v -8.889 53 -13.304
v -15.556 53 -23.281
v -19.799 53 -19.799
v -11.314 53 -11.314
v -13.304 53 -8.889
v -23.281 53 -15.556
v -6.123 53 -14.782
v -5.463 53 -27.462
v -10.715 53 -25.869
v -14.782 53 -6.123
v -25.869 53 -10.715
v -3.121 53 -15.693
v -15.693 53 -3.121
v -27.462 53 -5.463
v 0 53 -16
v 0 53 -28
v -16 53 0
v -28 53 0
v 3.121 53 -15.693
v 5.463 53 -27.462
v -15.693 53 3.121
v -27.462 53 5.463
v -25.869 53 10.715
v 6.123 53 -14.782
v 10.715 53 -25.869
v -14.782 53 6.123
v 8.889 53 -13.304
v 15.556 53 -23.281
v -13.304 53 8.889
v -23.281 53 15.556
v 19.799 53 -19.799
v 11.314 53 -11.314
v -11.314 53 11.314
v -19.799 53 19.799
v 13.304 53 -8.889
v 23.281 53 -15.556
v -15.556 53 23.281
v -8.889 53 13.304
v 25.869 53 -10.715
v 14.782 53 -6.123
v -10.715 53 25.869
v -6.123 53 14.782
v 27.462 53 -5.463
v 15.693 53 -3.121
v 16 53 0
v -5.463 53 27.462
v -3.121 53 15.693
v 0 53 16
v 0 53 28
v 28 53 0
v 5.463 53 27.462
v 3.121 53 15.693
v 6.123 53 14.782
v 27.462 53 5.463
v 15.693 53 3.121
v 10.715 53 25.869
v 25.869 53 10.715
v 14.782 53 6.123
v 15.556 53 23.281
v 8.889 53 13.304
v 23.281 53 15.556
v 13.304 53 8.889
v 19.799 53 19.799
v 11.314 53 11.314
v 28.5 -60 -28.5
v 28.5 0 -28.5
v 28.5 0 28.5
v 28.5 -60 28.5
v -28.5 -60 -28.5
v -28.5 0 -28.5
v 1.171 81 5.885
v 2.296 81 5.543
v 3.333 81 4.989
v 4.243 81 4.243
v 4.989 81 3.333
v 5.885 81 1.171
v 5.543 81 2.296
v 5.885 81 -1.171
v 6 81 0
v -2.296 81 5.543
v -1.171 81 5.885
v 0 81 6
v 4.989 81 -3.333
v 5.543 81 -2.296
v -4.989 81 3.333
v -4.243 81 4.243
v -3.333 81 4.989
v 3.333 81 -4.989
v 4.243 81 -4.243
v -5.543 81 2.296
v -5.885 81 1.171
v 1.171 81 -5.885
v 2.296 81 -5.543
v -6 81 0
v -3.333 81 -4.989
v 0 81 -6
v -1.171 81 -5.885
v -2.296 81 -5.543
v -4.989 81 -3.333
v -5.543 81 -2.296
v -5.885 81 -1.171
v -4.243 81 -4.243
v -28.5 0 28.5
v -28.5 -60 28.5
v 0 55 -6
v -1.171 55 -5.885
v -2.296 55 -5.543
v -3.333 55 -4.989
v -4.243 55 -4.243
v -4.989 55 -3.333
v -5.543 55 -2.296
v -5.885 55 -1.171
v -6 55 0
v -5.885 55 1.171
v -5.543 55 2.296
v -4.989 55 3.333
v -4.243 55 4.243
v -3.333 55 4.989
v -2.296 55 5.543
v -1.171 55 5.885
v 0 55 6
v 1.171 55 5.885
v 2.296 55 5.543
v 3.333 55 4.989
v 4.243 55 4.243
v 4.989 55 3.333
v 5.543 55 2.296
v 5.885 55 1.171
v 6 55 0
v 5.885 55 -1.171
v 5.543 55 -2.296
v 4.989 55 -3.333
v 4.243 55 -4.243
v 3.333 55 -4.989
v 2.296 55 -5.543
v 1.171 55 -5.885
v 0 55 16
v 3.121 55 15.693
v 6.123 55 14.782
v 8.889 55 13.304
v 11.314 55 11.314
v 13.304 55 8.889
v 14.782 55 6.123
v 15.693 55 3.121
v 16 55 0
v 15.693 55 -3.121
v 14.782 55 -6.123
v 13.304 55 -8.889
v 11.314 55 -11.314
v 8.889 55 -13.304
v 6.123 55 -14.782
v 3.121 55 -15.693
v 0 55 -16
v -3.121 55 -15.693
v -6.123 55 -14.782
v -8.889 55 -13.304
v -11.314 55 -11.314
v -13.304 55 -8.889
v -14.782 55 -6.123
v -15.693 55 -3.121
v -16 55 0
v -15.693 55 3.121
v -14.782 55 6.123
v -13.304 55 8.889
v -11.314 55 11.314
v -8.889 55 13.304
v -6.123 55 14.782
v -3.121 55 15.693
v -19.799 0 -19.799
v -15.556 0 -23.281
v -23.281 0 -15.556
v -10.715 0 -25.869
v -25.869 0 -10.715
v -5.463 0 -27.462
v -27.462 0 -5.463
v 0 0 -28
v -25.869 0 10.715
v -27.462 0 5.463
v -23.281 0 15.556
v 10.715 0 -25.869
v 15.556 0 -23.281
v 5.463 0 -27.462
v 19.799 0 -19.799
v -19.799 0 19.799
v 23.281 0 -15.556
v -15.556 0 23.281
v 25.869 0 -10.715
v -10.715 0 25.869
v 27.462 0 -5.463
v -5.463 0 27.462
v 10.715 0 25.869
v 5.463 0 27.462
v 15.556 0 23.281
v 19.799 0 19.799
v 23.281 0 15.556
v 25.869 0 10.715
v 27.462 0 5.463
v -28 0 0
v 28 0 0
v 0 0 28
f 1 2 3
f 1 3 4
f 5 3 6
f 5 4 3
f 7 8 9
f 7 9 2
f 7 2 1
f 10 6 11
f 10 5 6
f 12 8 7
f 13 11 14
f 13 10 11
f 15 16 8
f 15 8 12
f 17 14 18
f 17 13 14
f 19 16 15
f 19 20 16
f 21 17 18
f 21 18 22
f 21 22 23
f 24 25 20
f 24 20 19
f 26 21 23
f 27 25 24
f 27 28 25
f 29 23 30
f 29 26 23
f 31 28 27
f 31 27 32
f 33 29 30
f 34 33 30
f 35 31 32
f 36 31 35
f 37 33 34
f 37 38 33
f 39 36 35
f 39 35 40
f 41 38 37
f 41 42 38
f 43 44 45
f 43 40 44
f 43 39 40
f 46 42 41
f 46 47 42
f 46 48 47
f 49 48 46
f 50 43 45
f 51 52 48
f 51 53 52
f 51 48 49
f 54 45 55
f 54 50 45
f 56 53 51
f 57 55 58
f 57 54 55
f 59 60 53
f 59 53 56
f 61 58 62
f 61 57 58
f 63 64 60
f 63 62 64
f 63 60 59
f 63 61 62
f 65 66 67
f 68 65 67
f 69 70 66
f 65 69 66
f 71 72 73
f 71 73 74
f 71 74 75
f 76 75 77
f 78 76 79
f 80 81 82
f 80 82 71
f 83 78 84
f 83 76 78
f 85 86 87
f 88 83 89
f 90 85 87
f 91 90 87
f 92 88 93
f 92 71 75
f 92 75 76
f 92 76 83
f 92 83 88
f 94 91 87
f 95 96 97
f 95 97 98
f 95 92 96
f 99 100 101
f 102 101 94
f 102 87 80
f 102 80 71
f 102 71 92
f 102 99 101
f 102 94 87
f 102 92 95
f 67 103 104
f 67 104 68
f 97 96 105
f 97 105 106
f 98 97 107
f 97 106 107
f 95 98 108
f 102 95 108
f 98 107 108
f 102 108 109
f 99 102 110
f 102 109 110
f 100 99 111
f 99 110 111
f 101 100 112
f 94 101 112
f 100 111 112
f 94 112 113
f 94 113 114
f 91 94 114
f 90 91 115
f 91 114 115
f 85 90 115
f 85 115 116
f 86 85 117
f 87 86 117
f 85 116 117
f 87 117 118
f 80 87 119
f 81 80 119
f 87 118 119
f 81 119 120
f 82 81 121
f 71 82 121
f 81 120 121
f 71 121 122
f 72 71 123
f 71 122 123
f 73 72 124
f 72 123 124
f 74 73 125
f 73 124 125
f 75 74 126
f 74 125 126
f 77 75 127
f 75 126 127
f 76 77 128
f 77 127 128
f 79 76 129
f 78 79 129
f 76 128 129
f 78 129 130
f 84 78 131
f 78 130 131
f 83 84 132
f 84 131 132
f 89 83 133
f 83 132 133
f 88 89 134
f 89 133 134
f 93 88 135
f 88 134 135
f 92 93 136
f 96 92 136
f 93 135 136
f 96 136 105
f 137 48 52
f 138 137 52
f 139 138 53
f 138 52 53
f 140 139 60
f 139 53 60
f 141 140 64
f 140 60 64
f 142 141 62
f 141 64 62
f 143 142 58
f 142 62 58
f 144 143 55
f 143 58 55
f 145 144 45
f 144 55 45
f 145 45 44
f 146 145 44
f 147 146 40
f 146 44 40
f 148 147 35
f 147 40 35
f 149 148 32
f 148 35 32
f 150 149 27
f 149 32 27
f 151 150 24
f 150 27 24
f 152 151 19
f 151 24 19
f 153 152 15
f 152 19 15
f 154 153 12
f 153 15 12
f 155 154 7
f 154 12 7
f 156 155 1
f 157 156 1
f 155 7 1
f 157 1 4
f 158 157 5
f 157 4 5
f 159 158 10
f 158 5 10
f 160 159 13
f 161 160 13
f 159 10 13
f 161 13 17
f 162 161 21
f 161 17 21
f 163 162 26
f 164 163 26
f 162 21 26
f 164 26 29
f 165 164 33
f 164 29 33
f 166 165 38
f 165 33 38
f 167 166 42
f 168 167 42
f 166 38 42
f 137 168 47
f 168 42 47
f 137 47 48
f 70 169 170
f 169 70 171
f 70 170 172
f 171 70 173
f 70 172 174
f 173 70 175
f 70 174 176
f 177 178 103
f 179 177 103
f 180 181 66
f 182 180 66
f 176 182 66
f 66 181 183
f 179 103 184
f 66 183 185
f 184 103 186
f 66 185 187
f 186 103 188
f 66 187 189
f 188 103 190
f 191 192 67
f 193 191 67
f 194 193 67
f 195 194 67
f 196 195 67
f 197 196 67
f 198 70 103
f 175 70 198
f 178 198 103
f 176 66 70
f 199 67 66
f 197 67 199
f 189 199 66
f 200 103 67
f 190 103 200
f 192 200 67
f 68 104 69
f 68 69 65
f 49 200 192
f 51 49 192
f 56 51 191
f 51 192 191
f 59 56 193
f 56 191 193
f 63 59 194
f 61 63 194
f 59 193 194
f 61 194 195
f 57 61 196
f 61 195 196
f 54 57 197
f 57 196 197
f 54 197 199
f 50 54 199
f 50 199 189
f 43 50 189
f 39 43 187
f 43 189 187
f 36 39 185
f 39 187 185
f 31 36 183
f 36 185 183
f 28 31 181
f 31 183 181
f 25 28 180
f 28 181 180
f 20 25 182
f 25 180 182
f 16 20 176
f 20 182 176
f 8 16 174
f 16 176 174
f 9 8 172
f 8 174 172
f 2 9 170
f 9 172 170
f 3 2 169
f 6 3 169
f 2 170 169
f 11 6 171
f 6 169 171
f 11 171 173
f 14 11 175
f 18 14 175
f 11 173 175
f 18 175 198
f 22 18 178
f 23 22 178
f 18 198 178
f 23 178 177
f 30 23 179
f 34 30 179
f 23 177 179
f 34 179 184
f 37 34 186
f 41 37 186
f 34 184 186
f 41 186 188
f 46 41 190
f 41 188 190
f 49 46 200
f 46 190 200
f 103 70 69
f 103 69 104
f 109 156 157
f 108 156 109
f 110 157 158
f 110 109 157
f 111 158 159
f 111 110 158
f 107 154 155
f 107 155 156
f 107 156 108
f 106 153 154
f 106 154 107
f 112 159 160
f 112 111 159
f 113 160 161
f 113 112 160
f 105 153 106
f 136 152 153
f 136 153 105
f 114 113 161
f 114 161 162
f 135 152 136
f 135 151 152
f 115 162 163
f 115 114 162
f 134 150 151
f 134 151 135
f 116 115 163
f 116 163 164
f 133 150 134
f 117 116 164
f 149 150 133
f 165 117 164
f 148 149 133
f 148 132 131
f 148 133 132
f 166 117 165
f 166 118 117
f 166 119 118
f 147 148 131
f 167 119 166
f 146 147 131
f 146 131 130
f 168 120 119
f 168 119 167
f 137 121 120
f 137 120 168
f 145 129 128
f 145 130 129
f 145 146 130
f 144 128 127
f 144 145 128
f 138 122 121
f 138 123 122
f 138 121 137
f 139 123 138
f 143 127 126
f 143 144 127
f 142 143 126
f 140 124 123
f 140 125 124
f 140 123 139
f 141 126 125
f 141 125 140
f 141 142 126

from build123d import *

# Parameters (mm, degrees)
SKETCH1_R           = 28
BOSS_EXTRUDE1_DEPTH = 53
SKETCH2_R           = 16
BOSS_EXTRUDE2_DEPTH = 2
SKETCH3_R           = 6
BOSS_EXTRUDE3_DEPTH = 26
SKETCH4_W           = 57
SKETCH4_H           = 57
BOSS_EXTRUDE4_DEPTH = 60


with BuildPart() as part:
    # Sketch1 → Boss-Extrude1 (new body)
    with BuildSketch(Plane(origin=(0, 0, 0), x_dir=(1, 0, 0), z_dir=(0, 1, 0))):
        with Locations(Location((0, 0, 0), (0, 0, 270))):
            Circle(SKETCH1_R)
    extrude(amount=BOSS_EXTRUDE1_DEPTH)

    # Sketch2 → Boss-Extrude2 (add)
    with BuildSketch(Plane(origin=(0, 53, 0), x_dir=(1, 0, 0), z_dir=(0, 1, 0))):
        with Locations(Location((0, 0, 0), (0, 0, 270))):
            Circle(SKETCH2_R)
    extrude(amount=BOSS_EXTRUDE2_DEPTH)

    # Sketch3 → Boss-Extrude3 (add)
    with BuildSketch(Plane(origin=(0, 55, 0), x_dir=(1, 0, 0), z_dir=(0, 1, 0))):
        with Locations(Location((0, 0, 0), (0, 0, 90))):
            Circle(SKETCH3_R)
    extrude(amount=BOSS_EXTRUDE3_DEPTH)

    # Sketch4 → Boss-Extrude4 (add)
    with BuildSketch(Plane.XZ):
        Rectangle(SKETCH4_W, SKETCH4_H)
    extrude(amount=BOSS_EXTRUDE4_DEPTH)


solid = part.part
